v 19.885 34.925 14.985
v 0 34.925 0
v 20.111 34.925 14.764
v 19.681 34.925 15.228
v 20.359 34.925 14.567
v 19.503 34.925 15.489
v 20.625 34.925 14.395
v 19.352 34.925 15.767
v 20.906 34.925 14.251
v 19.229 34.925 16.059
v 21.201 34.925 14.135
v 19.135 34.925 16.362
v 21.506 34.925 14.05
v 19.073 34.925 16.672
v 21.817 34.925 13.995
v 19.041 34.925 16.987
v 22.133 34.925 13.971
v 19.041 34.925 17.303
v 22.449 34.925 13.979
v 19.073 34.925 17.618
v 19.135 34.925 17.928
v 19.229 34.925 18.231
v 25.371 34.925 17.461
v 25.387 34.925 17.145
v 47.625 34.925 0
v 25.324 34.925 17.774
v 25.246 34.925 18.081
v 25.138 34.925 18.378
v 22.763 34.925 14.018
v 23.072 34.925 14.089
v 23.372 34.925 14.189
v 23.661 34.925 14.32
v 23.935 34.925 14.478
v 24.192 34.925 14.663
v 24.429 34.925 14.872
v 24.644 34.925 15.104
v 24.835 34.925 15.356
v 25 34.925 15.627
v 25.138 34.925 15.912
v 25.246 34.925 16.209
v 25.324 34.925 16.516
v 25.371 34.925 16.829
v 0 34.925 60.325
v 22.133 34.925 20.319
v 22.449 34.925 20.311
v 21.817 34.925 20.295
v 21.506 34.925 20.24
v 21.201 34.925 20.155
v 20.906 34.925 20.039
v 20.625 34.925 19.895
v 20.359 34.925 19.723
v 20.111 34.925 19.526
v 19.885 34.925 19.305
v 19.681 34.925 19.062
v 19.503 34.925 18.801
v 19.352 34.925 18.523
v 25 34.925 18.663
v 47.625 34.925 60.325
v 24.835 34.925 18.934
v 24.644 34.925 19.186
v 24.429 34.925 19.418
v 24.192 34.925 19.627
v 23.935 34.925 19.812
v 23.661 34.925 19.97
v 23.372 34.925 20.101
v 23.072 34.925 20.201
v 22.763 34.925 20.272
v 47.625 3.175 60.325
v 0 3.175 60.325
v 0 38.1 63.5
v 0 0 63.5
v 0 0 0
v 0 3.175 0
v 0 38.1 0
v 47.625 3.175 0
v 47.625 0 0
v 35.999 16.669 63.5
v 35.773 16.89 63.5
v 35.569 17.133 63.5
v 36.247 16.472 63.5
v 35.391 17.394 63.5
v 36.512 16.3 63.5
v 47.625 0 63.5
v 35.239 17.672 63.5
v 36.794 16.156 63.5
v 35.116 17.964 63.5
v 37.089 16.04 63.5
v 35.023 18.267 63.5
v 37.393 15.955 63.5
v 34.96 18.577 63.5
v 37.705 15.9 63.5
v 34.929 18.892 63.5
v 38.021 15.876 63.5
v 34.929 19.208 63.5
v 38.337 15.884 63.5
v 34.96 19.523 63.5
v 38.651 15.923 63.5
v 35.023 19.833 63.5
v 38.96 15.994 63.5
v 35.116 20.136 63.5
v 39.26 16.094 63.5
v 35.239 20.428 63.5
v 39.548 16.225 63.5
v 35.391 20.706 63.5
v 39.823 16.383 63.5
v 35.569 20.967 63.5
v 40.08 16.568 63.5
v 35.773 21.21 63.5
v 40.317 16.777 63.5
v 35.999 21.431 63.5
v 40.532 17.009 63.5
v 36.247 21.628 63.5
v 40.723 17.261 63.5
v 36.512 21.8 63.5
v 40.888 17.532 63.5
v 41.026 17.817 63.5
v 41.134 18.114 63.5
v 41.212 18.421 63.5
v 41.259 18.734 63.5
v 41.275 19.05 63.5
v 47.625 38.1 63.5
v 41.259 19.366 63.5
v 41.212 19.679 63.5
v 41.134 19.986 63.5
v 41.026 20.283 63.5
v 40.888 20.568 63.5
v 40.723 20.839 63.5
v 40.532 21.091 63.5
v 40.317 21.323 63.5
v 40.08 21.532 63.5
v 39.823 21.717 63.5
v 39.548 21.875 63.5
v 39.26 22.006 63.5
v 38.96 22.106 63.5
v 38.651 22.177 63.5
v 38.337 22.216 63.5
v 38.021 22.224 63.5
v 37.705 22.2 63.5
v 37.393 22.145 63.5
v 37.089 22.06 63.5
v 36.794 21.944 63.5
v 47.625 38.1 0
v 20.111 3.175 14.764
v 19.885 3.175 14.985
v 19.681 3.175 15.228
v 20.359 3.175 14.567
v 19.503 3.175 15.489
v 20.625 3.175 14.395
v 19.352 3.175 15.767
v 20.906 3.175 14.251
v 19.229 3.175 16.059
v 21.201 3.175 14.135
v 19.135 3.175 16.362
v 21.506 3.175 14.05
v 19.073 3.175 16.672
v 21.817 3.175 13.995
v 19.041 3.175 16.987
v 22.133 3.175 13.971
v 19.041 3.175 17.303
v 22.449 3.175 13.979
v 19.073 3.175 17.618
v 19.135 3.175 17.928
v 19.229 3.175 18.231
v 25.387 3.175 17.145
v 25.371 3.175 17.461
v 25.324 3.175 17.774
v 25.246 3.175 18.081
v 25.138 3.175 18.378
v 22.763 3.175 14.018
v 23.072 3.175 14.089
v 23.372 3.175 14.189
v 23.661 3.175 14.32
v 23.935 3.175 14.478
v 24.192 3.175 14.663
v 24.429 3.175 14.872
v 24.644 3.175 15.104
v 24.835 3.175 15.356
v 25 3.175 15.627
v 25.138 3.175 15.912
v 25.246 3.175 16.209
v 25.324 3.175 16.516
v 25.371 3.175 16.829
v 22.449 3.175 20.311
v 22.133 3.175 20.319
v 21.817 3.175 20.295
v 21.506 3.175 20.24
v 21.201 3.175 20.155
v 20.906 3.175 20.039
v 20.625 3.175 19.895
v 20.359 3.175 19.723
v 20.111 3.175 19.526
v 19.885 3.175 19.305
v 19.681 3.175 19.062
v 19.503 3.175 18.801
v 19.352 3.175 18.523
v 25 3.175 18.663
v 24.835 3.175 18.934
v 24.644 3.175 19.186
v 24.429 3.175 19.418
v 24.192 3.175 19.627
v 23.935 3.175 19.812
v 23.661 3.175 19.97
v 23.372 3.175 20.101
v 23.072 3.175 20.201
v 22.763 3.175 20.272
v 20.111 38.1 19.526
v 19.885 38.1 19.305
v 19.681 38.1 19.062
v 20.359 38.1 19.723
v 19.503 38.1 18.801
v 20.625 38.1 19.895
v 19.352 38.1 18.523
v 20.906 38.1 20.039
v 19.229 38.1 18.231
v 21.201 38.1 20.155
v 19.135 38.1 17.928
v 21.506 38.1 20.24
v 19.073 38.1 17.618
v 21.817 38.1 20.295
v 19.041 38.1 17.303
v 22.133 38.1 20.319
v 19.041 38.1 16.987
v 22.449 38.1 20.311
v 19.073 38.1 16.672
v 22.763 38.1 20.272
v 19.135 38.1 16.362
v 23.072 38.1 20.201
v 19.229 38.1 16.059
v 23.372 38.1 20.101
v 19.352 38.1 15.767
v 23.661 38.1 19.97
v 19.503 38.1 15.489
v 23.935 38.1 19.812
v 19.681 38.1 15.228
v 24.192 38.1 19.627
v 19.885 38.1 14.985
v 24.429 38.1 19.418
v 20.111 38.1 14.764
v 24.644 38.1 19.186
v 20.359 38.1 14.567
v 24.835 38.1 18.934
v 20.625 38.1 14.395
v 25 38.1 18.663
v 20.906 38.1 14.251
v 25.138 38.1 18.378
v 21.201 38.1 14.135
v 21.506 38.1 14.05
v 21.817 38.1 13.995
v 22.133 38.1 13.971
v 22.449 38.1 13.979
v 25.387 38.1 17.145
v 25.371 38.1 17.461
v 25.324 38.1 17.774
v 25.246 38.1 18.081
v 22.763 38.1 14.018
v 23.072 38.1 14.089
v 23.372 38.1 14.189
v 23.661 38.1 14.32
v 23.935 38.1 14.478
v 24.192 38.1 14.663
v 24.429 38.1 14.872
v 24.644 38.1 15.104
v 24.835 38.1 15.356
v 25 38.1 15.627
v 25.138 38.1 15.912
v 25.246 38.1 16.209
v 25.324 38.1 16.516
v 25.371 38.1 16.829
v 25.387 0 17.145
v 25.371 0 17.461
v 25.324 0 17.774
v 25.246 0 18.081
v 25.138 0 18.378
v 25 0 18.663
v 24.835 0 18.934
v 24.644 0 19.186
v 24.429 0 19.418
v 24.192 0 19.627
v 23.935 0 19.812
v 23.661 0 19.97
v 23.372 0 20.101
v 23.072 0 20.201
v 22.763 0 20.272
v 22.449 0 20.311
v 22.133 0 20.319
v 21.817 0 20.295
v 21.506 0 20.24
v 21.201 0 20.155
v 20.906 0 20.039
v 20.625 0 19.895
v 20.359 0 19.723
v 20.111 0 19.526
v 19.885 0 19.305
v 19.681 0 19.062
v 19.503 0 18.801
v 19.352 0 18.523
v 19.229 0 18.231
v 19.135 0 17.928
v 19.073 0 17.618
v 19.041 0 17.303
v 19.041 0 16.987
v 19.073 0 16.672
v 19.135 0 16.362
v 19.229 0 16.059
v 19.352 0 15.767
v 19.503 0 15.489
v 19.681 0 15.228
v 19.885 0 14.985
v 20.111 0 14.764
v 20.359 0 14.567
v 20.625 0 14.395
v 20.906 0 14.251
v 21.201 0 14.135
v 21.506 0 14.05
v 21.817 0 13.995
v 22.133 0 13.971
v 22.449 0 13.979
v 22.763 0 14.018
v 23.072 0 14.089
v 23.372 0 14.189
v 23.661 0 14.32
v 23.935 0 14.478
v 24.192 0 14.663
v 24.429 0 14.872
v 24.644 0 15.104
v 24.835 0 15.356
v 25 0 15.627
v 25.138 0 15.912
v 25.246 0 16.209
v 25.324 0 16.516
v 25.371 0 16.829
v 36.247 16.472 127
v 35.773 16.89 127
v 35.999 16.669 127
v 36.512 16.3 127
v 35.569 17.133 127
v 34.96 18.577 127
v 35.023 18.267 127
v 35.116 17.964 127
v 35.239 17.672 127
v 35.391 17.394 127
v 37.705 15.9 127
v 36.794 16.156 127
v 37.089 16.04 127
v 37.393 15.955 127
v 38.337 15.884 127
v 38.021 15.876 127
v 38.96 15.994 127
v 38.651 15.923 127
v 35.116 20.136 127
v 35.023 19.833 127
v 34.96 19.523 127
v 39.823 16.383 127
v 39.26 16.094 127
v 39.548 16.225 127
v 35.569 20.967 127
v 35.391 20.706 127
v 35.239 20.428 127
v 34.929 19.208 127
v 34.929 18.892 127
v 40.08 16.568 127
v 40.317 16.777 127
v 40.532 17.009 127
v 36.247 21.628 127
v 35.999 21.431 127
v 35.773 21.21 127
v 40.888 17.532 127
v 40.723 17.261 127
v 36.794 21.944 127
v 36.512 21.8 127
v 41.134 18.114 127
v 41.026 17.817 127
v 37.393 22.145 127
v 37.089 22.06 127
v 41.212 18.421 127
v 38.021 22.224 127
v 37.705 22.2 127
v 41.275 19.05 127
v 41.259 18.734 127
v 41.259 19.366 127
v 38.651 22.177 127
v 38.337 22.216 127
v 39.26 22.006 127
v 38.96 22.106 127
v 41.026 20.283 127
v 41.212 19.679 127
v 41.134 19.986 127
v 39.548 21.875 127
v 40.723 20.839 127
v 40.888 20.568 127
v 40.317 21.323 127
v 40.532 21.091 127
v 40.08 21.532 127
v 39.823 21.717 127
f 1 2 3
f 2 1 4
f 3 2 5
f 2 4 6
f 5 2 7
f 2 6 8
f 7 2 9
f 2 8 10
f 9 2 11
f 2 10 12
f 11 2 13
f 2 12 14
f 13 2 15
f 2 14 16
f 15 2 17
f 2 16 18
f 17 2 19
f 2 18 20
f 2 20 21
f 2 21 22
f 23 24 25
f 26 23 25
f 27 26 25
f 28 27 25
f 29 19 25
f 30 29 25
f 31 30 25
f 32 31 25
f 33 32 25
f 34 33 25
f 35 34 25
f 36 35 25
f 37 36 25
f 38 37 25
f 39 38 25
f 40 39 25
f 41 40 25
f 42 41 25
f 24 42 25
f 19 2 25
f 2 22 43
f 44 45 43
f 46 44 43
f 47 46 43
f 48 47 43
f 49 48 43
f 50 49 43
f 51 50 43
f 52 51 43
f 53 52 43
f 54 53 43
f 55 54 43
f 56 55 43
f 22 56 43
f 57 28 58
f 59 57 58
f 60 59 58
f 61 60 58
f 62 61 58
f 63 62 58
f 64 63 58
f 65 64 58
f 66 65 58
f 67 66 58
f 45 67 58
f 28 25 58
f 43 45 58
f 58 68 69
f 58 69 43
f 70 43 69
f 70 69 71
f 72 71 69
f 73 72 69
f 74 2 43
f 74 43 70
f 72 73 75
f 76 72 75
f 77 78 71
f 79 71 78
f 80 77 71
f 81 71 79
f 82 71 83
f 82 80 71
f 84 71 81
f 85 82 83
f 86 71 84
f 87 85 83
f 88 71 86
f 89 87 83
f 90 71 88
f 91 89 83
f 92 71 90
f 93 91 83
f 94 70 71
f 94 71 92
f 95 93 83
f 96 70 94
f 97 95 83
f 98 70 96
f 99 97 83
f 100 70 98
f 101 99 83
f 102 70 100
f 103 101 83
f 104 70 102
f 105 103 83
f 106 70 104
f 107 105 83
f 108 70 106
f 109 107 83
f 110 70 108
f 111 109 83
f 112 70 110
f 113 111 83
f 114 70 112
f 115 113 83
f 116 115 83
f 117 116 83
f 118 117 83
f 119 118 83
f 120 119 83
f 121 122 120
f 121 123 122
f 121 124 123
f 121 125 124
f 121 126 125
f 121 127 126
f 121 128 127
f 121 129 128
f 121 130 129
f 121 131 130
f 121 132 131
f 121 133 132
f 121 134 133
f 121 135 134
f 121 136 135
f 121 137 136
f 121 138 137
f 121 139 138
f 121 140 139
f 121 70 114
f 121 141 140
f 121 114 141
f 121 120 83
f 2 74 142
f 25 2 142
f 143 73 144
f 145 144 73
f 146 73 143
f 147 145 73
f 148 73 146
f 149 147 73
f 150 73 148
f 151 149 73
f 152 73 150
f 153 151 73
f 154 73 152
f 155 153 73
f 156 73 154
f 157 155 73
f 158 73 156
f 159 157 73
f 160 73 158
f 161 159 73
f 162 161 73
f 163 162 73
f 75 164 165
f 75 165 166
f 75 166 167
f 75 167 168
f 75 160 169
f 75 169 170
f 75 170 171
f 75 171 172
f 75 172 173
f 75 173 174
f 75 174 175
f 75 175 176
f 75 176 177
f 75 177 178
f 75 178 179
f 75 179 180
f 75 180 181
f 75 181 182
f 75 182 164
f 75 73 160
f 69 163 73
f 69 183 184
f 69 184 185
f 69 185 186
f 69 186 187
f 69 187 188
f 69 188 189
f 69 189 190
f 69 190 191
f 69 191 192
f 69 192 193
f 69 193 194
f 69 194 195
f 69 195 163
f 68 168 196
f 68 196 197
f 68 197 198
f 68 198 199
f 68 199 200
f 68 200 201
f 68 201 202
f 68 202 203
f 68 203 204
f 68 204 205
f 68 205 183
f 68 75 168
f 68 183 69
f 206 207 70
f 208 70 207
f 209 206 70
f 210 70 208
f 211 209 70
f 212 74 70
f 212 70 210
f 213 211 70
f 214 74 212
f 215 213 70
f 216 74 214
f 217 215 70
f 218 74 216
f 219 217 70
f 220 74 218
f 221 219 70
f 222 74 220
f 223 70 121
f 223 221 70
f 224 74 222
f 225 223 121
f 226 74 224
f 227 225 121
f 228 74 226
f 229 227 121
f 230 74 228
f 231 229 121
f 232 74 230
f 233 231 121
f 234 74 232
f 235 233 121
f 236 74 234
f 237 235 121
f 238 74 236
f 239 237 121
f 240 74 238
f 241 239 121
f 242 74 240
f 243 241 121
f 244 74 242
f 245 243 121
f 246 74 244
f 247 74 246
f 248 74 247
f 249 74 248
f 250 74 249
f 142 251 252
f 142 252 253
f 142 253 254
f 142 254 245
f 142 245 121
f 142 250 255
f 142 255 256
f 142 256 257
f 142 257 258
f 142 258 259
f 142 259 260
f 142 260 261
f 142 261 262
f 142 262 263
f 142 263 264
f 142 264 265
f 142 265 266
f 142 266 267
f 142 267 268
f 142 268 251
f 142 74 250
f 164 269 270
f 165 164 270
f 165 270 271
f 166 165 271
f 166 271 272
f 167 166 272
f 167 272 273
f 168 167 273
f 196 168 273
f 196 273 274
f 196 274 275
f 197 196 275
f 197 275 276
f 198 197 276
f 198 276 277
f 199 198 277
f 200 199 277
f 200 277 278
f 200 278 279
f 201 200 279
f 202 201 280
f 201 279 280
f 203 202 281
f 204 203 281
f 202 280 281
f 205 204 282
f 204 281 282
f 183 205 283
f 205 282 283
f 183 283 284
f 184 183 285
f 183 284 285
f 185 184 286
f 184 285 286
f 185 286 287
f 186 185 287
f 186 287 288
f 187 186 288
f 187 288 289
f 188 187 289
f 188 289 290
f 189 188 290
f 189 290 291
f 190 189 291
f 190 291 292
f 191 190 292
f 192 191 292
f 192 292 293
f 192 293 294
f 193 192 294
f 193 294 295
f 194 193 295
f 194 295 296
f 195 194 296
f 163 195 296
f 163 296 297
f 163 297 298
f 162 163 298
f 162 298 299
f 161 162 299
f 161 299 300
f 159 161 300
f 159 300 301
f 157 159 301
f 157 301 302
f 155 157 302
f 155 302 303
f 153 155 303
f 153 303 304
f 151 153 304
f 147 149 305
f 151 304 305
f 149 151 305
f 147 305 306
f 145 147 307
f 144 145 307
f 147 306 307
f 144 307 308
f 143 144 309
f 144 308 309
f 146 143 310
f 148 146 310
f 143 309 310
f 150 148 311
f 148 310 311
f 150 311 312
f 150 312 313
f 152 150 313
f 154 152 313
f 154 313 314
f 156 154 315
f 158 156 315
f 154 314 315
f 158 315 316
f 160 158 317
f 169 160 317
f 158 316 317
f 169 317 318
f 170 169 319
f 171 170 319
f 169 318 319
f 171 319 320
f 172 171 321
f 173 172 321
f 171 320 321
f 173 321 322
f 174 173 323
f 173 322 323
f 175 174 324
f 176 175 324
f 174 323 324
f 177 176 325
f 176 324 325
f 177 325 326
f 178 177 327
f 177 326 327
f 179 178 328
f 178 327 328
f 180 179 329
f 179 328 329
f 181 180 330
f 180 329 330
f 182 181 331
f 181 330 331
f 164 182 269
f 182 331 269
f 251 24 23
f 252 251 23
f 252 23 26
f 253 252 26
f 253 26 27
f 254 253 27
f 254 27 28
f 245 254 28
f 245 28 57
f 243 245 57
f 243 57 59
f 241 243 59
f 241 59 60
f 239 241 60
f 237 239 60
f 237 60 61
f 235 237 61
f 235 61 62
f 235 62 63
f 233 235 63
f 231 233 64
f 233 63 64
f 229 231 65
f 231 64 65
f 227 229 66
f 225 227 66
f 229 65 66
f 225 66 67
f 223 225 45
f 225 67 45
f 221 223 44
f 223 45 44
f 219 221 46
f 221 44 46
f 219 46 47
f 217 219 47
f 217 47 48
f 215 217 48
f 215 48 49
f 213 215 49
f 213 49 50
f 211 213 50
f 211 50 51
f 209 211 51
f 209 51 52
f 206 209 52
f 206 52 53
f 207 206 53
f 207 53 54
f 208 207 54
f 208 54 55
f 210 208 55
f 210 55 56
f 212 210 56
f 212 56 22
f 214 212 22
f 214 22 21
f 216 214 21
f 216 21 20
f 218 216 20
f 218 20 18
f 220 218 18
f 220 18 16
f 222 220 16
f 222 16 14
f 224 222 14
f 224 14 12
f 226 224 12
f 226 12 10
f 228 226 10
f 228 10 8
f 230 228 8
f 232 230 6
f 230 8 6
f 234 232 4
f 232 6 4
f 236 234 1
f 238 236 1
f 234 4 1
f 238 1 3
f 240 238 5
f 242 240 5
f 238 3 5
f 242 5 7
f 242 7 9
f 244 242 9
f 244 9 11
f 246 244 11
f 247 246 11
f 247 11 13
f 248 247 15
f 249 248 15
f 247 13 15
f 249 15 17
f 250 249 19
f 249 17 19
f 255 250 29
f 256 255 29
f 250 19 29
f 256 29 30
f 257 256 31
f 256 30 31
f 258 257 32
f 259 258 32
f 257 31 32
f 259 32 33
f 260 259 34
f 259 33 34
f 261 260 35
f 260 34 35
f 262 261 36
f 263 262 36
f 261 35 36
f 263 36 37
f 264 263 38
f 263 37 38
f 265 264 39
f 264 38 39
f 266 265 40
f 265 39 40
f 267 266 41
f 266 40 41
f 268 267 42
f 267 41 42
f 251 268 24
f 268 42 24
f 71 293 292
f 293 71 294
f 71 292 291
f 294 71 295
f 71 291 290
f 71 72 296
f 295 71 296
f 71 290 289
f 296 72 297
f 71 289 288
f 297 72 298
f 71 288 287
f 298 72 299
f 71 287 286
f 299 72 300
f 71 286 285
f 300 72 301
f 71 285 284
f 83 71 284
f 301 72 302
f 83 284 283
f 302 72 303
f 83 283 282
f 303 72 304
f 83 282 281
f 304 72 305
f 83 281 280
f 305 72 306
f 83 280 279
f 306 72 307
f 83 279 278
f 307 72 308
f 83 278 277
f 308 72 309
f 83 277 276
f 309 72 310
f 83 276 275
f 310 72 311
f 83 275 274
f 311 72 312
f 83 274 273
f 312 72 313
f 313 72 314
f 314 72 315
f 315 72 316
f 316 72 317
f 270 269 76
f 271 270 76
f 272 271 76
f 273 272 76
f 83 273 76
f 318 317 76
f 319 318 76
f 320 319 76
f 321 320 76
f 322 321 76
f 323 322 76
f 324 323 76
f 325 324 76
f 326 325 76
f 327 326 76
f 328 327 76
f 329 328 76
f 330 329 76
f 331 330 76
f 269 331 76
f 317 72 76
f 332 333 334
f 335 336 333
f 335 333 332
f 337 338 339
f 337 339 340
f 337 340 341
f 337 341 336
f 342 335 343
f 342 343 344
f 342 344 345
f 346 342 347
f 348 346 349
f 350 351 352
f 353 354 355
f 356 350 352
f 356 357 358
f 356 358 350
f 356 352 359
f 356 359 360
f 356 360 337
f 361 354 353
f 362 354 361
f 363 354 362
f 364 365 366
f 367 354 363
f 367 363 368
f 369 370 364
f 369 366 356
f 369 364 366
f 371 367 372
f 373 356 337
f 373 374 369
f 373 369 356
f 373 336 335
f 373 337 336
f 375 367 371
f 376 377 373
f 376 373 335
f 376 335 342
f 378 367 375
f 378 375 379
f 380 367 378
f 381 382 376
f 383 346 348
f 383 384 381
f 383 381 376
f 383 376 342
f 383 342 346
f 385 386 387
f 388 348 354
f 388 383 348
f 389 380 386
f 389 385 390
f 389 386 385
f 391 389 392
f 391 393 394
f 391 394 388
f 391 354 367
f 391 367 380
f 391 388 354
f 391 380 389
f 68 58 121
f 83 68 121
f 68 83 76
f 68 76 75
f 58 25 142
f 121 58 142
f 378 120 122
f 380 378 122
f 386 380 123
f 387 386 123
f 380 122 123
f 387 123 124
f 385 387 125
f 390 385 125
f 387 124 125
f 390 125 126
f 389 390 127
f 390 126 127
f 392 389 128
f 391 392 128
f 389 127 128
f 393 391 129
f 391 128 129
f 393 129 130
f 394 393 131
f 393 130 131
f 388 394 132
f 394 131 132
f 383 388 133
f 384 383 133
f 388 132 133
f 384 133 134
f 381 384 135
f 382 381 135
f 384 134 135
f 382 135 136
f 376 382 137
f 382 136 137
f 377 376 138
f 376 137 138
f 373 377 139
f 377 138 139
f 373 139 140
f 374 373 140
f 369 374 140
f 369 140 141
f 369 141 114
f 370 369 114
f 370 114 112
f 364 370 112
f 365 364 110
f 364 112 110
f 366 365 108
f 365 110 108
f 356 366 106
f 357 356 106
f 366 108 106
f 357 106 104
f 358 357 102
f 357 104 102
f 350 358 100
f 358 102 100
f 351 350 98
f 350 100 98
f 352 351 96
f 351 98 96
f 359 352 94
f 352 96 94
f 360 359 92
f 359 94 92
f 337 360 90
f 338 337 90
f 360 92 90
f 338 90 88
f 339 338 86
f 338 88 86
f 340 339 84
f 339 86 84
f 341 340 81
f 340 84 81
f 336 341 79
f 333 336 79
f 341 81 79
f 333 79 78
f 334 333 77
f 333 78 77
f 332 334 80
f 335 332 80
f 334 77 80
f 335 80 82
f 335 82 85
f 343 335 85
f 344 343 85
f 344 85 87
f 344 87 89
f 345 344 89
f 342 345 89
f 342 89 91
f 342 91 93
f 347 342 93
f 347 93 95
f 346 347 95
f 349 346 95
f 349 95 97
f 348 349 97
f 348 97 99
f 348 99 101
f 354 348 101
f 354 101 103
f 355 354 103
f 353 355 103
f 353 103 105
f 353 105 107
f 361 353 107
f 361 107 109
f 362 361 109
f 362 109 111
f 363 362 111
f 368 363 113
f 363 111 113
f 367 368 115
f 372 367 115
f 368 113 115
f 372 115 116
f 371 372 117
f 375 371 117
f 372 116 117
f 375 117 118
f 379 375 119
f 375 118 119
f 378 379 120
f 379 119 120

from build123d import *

# Parameters (mm, degrees)
F0_W     = 47.625
F0_H     = 38.1
F1_DEPTH = 63.5
F2_W     = 31.75
F2_H     = 60.325
F3_DEPTH = 47.625
F4_R     = 3.175
F5_DEPTH = 63.5
F6_R     = 3.175
F7_DEPTH = 45.974


with BuildPart() as f1:
    # F0 (on Top) → F1 (new body)
    with BuildSketch(Plane.XY):
        with Locations((23.8125, 19.05)):
            Rectangle(F0_W, F0_H)
    extrude(amount=F1_DEPTH)

    # F2 (on face) → F3 (cut)
    with BuildSketch(Plane.YZ.offset(47.625)):
        with Locations((19.05, 30.1625)):
            Rectangle(F2_W, F2_H)
    extrude(amount=-F3_DEPTH, mode=Mode.SUBTRACT)

    # F4 (on face) → F5 (join)
    with BuildSketch(Plane.XY.offset(63.5)):
        with Locations((38.1, 19.05)):
            Circle(F4_R)
    extrude(amount=F5_DEPTH)

    # F6 (on face) → F7 (cut)
    with BuildSketch(Plane.XZ):
        with Locations((22.212138, 17.145)):
            Circle(F6_R)
    extrude(amount=-F7_DEPTH, mode=Mode.SUBTRACT)


solid = f1.part
